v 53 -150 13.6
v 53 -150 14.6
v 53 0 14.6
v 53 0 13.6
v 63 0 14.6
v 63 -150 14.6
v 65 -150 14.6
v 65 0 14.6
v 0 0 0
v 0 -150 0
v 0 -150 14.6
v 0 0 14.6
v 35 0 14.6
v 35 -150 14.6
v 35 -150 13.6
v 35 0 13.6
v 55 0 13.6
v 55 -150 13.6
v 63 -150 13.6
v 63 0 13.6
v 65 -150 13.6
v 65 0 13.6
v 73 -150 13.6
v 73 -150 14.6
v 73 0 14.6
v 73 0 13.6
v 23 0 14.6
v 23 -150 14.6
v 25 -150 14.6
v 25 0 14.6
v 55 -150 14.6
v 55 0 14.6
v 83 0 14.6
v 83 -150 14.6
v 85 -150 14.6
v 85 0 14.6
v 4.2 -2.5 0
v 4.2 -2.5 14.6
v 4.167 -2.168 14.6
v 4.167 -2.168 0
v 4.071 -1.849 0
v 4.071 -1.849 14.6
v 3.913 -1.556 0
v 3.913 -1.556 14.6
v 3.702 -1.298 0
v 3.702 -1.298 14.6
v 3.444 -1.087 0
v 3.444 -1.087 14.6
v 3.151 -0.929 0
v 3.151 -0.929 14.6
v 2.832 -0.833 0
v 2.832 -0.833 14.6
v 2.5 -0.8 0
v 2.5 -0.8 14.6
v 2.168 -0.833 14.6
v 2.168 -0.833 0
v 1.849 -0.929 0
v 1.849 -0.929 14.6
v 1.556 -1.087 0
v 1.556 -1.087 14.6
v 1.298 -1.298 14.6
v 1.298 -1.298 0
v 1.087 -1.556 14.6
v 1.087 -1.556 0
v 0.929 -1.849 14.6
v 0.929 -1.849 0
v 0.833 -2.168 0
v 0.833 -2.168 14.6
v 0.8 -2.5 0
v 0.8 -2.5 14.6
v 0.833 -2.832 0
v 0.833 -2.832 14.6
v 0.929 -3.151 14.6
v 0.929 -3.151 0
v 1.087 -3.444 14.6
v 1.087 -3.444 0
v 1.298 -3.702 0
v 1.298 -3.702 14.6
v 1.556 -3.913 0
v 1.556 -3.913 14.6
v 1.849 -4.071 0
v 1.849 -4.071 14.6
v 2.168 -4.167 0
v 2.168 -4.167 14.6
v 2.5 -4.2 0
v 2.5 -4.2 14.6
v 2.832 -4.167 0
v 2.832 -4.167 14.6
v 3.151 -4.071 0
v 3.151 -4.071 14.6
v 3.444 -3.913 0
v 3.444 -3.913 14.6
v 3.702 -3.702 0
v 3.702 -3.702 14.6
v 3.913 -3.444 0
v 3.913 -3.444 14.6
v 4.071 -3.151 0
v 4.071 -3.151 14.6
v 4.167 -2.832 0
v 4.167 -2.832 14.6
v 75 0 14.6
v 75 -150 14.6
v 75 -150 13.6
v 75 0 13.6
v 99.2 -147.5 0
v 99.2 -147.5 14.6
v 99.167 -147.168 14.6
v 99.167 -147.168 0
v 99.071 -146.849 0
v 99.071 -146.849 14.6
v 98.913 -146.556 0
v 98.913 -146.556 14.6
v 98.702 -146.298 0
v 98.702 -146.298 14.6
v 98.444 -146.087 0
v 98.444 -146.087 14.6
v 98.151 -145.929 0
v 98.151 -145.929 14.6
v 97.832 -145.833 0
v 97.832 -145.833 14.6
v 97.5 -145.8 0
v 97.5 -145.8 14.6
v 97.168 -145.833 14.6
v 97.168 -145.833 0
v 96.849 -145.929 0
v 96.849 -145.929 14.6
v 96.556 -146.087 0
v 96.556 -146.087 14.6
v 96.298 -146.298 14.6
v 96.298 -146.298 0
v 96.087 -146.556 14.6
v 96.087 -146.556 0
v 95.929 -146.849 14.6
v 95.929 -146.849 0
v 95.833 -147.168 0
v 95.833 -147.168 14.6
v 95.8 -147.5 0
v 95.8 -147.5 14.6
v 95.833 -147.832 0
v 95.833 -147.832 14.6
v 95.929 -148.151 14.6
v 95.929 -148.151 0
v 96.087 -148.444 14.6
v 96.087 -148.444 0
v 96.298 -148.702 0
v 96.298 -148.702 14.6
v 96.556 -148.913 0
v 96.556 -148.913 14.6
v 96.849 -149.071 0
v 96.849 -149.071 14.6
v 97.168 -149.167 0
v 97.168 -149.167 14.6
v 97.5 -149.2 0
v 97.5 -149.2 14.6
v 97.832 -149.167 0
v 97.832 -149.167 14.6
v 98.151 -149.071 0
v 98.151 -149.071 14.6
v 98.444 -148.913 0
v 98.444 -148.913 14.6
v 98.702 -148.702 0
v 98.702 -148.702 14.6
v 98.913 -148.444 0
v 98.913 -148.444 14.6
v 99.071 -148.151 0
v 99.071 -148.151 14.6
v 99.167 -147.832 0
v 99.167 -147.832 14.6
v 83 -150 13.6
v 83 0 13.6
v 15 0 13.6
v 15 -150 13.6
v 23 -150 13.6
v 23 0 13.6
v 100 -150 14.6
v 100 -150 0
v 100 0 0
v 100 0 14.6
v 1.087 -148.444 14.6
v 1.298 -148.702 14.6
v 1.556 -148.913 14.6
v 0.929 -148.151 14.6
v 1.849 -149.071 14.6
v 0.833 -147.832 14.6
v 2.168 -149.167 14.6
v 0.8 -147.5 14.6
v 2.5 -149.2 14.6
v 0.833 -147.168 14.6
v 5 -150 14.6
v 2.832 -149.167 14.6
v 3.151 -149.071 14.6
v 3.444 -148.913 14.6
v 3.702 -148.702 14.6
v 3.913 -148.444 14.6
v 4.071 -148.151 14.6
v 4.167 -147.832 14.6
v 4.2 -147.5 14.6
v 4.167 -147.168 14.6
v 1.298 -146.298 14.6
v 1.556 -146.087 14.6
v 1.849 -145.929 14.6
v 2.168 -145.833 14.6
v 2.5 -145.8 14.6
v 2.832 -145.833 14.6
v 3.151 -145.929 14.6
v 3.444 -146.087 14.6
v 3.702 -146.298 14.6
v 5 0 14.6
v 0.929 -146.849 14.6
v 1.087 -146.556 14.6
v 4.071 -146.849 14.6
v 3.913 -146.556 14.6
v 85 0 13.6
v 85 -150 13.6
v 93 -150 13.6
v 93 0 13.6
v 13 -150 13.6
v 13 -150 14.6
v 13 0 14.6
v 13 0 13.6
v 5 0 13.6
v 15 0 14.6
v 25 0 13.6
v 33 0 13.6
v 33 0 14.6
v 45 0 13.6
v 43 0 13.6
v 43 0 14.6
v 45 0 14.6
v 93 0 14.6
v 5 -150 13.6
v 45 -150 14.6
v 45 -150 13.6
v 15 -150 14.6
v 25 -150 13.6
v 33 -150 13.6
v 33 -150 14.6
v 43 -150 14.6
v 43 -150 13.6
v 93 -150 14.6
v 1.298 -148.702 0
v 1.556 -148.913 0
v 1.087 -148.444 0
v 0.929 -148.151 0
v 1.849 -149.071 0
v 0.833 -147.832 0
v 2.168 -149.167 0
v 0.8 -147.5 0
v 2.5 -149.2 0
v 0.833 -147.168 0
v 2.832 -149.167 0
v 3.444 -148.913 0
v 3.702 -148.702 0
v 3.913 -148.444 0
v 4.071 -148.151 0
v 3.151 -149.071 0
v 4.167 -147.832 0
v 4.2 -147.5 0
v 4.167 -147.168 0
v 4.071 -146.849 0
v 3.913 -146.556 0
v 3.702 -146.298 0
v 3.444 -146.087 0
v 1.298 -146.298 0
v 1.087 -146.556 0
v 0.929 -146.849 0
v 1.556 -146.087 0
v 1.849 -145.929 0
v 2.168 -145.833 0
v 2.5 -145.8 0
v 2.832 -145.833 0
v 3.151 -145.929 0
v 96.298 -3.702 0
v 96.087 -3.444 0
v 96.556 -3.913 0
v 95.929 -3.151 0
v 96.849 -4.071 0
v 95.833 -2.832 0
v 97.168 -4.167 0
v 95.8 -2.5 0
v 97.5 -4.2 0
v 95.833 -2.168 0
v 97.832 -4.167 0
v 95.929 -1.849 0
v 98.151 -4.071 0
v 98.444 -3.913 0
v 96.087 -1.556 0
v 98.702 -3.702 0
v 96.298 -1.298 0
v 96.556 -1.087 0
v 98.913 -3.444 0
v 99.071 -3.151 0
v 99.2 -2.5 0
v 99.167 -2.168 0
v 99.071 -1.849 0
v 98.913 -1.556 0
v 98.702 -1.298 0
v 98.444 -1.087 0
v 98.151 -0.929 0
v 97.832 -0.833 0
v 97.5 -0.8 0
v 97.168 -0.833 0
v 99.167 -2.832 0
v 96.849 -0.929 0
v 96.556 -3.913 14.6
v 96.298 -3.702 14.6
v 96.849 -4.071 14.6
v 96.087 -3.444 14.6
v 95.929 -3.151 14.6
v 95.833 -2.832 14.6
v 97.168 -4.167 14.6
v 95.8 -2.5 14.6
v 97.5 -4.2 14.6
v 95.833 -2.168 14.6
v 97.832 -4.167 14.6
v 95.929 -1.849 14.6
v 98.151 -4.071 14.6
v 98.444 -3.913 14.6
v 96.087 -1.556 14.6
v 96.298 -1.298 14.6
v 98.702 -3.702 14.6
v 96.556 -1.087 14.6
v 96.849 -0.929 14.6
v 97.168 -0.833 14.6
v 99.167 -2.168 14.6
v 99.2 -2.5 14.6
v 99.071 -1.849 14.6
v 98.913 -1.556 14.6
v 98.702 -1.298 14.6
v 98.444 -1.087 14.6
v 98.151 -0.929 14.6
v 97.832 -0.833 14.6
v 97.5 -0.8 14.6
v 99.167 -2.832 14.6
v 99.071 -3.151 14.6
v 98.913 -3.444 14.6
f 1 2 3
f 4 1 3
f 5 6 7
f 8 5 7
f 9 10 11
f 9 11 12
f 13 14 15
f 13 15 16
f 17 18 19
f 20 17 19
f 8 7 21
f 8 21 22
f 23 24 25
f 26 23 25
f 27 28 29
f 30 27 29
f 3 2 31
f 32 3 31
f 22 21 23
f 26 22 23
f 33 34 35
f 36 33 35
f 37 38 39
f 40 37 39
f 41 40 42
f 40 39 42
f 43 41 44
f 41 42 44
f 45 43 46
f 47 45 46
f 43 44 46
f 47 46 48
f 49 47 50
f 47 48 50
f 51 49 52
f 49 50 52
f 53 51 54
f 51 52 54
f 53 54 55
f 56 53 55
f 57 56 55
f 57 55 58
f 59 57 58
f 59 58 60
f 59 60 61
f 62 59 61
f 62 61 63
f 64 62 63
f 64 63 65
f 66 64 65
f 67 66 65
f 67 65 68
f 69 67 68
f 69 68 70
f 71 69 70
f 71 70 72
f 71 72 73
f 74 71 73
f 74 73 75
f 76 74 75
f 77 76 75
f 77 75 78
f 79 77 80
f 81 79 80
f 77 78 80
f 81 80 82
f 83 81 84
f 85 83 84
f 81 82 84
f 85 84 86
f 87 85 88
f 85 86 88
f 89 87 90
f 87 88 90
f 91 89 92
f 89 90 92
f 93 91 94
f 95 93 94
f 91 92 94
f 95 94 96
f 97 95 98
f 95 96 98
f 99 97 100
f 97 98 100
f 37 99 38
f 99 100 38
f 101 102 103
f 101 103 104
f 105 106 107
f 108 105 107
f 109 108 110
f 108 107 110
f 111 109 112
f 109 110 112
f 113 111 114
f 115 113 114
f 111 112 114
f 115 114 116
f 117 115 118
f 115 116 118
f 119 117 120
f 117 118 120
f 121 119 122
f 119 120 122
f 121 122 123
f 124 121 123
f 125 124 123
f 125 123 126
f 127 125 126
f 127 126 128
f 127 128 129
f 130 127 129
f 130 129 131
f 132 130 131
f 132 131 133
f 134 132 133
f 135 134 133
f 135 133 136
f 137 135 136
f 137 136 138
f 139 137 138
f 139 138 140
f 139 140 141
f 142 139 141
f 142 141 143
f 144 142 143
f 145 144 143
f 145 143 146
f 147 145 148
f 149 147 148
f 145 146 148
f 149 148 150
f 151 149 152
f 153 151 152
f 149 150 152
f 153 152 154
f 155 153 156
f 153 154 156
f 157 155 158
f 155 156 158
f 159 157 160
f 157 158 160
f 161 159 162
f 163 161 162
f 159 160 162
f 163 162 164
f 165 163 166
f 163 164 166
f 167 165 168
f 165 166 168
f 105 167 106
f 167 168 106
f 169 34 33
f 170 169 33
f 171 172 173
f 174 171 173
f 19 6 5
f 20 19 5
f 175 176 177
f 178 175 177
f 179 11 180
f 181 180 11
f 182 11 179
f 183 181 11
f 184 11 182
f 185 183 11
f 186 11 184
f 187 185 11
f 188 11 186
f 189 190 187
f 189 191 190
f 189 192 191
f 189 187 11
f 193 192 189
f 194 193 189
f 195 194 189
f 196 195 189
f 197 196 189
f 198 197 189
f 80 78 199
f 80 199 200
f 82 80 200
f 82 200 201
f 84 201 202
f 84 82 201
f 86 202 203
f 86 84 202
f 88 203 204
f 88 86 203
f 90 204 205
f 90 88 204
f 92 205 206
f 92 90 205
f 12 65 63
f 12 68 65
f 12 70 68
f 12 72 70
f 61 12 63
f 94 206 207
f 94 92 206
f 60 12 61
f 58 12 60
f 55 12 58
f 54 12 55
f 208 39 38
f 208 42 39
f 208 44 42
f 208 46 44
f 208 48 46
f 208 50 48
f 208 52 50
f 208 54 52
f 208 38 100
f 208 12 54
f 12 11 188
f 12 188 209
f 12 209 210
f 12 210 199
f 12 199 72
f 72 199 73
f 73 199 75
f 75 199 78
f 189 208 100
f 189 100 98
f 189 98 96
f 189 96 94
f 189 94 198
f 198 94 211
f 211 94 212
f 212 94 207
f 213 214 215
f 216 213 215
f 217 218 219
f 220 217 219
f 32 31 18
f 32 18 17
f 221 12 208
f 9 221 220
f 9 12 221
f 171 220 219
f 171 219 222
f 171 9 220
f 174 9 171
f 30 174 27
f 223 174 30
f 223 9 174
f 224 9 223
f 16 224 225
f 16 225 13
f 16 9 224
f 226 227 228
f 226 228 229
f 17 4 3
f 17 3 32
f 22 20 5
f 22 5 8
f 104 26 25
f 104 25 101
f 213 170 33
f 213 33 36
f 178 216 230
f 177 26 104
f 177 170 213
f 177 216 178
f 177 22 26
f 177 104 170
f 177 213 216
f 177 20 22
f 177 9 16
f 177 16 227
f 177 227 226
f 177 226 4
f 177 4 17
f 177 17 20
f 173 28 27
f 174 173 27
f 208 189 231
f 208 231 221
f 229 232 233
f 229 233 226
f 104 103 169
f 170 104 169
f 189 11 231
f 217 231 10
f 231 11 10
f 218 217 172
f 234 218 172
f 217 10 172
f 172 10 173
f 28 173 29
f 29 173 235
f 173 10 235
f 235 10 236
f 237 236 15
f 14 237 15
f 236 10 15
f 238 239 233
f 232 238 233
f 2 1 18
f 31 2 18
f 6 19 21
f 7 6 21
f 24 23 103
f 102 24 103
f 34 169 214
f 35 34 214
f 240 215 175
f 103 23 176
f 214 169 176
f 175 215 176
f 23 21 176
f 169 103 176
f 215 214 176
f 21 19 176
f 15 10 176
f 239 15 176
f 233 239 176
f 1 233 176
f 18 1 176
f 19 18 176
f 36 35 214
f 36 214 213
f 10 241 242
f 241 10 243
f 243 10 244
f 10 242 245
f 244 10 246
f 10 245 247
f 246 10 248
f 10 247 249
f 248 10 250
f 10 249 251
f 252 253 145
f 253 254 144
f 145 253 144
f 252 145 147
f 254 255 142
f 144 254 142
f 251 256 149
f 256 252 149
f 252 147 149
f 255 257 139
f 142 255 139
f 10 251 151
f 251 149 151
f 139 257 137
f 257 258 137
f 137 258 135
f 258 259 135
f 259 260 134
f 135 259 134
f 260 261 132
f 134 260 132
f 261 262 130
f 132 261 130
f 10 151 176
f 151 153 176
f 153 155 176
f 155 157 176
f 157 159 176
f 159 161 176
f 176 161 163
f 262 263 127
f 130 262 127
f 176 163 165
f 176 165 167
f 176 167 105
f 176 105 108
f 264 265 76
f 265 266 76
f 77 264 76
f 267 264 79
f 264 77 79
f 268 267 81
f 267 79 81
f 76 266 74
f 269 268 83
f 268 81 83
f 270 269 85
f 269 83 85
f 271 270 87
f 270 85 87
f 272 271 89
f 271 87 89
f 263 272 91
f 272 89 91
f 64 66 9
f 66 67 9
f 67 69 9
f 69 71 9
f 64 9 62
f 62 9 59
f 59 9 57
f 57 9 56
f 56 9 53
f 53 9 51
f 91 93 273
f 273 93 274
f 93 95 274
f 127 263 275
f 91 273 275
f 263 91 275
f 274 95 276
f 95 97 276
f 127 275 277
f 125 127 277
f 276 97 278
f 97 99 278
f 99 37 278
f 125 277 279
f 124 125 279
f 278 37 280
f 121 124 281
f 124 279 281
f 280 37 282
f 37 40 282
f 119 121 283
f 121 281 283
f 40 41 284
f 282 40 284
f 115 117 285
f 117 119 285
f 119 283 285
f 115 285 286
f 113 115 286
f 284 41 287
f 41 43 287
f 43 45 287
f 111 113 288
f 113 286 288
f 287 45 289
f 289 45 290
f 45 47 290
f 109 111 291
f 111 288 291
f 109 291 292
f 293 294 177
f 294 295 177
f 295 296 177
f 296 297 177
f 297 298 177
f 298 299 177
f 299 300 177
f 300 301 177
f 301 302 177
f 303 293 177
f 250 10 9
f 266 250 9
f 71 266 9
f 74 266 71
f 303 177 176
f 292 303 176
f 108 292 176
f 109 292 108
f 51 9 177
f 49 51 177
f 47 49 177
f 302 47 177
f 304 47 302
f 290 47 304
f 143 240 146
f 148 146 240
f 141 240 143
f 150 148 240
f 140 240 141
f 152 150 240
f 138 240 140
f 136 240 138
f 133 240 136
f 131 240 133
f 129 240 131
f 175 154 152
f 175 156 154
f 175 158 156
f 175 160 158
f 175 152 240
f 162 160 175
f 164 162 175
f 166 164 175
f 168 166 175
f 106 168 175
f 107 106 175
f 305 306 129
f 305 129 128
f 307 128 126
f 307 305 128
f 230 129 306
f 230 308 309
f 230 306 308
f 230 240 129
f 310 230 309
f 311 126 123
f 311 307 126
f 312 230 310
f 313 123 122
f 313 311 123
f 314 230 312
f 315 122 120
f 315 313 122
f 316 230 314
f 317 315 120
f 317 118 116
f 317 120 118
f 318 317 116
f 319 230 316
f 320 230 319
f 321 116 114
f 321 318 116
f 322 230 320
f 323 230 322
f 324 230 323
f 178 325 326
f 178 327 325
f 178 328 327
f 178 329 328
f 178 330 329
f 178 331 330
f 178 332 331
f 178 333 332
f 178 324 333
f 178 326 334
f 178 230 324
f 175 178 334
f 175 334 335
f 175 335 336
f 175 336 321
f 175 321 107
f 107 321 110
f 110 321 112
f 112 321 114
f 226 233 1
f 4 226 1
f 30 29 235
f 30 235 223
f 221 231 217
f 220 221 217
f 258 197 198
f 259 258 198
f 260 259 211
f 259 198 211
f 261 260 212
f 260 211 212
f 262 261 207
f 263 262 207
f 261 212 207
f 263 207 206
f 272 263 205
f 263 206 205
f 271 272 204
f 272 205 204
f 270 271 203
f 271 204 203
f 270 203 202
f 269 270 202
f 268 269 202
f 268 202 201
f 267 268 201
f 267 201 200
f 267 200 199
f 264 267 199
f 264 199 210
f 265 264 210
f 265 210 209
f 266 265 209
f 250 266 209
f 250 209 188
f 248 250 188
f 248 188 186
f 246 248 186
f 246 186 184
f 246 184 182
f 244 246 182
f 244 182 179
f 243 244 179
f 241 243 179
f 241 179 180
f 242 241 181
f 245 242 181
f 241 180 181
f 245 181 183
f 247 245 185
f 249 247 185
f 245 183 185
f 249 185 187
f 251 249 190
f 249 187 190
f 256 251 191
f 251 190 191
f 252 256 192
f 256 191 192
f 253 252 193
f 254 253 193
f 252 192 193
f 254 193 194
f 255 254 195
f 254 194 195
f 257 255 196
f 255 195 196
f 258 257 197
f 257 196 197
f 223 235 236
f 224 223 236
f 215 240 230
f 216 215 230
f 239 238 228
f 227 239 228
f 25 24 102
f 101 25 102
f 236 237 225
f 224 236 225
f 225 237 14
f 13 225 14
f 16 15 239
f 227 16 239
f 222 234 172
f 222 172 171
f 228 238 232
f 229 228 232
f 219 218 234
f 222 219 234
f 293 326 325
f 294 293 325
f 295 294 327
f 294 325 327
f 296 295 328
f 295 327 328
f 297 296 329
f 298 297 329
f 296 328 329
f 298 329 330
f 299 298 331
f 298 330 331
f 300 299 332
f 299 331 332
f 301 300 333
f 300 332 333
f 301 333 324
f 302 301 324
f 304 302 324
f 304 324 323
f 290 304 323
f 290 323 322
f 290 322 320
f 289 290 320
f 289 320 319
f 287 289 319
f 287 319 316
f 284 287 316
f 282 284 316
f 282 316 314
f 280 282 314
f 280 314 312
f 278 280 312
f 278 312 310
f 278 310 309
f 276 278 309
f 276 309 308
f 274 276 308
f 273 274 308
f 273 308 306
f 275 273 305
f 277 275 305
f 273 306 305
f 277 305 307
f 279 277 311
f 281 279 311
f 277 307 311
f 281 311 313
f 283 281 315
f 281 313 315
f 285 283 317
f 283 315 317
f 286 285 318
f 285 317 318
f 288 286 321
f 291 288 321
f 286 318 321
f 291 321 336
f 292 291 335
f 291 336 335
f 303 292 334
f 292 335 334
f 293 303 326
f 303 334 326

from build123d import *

# Parameters (mm, degrees)
F0_W     = 100
F0_H     = 150
F1_DEPTH = 14.6
F2_W     = 8
F2_H     = 150
F3_DEPTH = 1
F4_R     = 1.7
F5_DEPTH = 25


with BuildPart() as f1:
    # F0 (on Top) → F1 (new body)
    with BuildSketch(Plane.XY):
        with Locations((50, -75)):
            Rectangle(F0_W, F0_H)
    extrude(amount=F1_DEPTH)

    # F2 (on face) → F3 (cut)
    with BuildSketch(Plane.XY.offset(14.6)):
        with Locations((9, -75)):
            Rectangle(F2_W, F2_H)
        with Locations((19, -75)):
            Rectangle(F2_W, F2_H)
        with Locations((29, -75)):
            Rectangle(F2_W, F2_H)
        with Locations((39, -75)):
            Rectangle(F2_W, F2_H)
        with Locations((49, -75)):
            Rectangle(F2_W, F2_H)
        with Locations((59, -75)):
            Rectangle(F2_W, F2_H)
        with Locations((69, -75)):
            Rectangle(F2_W, F2_H)
        with Locations((79, -75)):
            Rectangle(F2_W, F2_H)
        with Locations((89, -75)):
            Rectangle(F2_W, F2_H)
    extrude(amount=-F3_DEPTH, mode=Mode.SUBTRACT)

    # F4 (on face) → F5 (cut)
    with BuildSketch(Plane.XY.offset(14.6)):
        with Locations((2.5, -2.5)):
            Circle(F4_R)
        with Locations((2.5, -147.5)):
            Circle(F4_R)
        with Locations((97.5, -147.5)):
            Circle(F4_R)
        with Locations((97.5, -2.5)):
            Circle(F4_R)
    extrude(amount=-F5_DEPTH, mode=Mode.SUBTRACT)


solid = f1.part
